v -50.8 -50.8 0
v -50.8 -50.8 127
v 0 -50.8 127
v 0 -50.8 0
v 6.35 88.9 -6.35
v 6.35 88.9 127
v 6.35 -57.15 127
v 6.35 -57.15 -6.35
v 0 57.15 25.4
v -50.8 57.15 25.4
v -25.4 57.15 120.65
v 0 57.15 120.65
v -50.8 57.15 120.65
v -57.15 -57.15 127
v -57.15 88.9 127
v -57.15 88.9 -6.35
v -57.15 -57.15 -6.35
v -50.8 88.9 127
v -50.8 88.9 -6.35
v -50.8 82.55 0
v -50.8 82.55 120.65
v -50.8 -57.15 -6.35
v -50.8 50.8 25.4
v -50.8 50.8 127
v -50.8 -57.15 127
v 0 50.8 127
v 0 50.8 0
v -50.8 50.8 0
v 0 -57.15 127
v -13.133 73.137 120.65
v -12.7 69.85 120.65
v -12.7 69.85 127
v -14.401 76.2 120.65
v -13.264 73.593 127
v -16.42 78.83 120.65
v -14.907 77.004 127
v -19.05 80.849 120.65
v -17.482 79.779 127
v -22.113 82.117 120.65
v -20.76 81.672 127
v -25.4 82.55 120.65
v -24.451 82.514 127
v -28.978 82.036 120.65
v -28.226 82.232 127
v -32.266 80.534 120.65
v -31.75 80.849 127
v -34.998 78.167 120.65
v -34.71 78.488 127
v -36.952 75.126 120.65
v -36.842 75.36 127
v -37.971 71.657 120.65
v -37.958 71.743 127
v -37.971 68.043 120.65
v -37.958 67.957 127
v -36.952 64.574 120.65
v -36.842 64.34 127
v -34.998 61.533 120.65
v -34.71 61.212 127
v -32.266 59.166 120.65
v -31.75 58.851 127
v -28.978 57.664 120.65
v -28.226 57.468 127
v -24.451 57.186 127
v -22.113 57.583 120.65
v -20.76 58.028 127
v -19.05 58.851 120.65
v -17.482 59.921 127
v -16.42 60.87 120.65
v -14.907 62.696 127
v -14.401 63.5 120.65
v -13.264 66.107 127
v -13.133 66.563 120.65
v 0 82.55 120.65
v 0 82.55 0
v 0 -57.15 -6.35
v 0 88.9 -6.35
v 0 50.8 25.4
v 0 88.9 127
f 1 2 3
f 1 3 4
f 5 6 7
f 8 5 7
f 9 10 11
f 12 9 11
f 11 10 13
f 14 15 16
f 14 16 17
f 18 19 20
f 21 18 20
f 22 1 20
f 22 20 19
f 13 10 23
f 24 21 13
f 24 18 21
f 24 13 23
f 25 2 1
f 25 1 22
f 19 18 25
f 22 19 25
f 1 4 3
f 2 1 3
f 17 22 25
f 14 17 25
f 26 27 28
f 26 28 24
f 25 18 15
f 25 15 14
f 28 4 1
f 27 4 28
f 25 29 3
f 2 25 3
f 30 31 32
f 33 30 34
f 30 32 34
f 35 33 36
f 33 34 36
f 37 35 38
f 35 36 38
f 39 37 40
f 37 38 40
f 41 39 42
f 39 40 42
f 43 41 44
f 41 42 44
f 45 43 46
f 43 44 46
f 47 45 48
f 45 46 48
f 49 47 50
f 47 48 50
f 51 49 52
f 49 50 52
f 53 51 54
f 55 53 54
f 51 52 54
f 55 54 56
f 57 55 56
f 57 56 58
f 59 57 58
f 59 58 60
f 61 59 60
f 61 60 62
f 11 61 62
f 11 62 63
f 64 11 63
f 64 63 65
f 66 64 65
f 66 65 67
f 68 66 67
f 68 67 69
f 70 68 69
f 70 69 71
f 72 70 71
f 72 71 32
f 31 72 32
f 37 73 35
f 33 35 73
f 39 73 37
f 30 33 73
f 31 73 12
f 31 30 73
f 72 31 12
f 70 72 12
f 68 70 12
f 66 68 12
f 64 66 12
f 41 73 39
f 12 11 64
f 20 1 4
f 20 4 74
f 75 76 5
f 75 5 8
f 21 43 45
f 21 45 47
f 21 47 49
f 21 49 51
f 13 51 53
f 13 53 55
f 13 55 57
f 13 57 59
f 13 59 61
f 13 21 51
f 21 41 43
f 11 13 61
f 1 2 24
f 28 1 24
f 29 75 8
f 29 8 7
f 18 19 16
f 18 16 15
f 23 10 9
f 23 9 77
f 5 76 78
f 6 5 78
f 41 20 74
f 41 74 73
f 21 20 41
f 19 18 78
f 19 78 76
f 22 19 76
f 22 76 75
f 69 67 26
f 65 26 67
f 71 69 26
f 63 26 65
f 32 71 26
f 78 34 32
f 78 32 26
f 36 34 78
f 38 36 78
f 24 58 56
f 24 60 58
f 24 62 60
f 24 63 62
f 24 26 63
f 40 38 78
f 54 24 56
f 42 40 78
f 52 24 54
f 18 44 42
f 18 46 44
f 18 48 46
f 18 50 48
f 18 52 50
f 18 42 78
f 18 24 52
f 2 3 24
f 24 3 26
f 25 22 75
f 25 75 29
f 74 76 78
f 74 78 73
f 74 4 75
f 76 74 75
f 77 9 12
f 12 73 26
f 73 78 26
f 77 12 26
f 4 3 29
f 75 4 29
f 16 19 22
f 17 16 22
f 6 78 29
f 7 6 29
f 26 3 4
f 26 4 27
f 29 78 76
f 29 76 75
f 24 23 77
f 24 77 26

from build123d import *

# Parameters (mm, degrees)
F0_W      = 101.6
F0_H      = 127
F1_DEPTH  = 50.8
F2_W      = 6.35
F2_H      = 95.25
F3_DEPTH  = 50.8
F4_W      = 146.05
F4_H      = 133.35
F5_DEPTH  = 6.35
F9_R      = 12.7
F10_DEPTH = 6.35


# Not quite as in the source:
# - a feature names something its author has since deleted; it is built from what else it names


with BuildPart() as f1:
    # F0 (on Right) → F1 (new body)
    with BuildSketch(Plane.YZ):
        with Locations((0, 63.5)):
            Rectangle(F0_W, F0_H)
    extrude(amount=-F1_DEPTH)


with BuildPart() as f3:
    # F2 (on face) → F3 (new body, through all)
    with BuildSketch(Plane(origin=(-50.8, 0, 0), x_dir=(0, -1, 0), z_dir=(-1, 0, 0))):
        Polygon((50.8, 127), (50.8, 0), (-82.55, 0), (-82.55, 120.65), (-57.15, 120.65), (-50.8, 120.65), (-50.8, 127), (-82.55, 127), (-88.9, 127), (-88.9, 0), (-88.9, -6.35), (57.15, -6.35), (57.15, 127), align=None)
        with Locations((-53.975, 73.025)):
            Rectangle(F2_W, F2_H)
    extrude(amount=-F3_DEPTH)

    # F9 (on face) → F10 (cut)
    with BuildSketch(Plane.XY.offset(127)):
        with Locations((-25.4, 69.85)):
            Circle(F9_R)
    extrude(amount=-F10_DEPTH, mode=Mode.SUBTRACT)


with BuildPart() as f5:
    # F4 (on face) → F5 (new body)
    with BuildSketch(Plane(origin=(-50.8, 0, 0), x_dir=(0, -1, 0), z_dir=(-1, 0, 0))):
        with Locations((-15.875, 60.325)):
            Rectangle(F4_W, F4_H)
    extrude(amount=F5_DEPTH)


with BuildPart() as f8_1:
    # F8: instance of F5
    add(f5.part.mirror(Plane(origin=(-25.4, 15.875, 60.325), x_dir=(0, -1, 0), z_dir=(1, 0, 0))))


solid = Compound([f1.part, f3.part, f5.part, f8_1.part])
